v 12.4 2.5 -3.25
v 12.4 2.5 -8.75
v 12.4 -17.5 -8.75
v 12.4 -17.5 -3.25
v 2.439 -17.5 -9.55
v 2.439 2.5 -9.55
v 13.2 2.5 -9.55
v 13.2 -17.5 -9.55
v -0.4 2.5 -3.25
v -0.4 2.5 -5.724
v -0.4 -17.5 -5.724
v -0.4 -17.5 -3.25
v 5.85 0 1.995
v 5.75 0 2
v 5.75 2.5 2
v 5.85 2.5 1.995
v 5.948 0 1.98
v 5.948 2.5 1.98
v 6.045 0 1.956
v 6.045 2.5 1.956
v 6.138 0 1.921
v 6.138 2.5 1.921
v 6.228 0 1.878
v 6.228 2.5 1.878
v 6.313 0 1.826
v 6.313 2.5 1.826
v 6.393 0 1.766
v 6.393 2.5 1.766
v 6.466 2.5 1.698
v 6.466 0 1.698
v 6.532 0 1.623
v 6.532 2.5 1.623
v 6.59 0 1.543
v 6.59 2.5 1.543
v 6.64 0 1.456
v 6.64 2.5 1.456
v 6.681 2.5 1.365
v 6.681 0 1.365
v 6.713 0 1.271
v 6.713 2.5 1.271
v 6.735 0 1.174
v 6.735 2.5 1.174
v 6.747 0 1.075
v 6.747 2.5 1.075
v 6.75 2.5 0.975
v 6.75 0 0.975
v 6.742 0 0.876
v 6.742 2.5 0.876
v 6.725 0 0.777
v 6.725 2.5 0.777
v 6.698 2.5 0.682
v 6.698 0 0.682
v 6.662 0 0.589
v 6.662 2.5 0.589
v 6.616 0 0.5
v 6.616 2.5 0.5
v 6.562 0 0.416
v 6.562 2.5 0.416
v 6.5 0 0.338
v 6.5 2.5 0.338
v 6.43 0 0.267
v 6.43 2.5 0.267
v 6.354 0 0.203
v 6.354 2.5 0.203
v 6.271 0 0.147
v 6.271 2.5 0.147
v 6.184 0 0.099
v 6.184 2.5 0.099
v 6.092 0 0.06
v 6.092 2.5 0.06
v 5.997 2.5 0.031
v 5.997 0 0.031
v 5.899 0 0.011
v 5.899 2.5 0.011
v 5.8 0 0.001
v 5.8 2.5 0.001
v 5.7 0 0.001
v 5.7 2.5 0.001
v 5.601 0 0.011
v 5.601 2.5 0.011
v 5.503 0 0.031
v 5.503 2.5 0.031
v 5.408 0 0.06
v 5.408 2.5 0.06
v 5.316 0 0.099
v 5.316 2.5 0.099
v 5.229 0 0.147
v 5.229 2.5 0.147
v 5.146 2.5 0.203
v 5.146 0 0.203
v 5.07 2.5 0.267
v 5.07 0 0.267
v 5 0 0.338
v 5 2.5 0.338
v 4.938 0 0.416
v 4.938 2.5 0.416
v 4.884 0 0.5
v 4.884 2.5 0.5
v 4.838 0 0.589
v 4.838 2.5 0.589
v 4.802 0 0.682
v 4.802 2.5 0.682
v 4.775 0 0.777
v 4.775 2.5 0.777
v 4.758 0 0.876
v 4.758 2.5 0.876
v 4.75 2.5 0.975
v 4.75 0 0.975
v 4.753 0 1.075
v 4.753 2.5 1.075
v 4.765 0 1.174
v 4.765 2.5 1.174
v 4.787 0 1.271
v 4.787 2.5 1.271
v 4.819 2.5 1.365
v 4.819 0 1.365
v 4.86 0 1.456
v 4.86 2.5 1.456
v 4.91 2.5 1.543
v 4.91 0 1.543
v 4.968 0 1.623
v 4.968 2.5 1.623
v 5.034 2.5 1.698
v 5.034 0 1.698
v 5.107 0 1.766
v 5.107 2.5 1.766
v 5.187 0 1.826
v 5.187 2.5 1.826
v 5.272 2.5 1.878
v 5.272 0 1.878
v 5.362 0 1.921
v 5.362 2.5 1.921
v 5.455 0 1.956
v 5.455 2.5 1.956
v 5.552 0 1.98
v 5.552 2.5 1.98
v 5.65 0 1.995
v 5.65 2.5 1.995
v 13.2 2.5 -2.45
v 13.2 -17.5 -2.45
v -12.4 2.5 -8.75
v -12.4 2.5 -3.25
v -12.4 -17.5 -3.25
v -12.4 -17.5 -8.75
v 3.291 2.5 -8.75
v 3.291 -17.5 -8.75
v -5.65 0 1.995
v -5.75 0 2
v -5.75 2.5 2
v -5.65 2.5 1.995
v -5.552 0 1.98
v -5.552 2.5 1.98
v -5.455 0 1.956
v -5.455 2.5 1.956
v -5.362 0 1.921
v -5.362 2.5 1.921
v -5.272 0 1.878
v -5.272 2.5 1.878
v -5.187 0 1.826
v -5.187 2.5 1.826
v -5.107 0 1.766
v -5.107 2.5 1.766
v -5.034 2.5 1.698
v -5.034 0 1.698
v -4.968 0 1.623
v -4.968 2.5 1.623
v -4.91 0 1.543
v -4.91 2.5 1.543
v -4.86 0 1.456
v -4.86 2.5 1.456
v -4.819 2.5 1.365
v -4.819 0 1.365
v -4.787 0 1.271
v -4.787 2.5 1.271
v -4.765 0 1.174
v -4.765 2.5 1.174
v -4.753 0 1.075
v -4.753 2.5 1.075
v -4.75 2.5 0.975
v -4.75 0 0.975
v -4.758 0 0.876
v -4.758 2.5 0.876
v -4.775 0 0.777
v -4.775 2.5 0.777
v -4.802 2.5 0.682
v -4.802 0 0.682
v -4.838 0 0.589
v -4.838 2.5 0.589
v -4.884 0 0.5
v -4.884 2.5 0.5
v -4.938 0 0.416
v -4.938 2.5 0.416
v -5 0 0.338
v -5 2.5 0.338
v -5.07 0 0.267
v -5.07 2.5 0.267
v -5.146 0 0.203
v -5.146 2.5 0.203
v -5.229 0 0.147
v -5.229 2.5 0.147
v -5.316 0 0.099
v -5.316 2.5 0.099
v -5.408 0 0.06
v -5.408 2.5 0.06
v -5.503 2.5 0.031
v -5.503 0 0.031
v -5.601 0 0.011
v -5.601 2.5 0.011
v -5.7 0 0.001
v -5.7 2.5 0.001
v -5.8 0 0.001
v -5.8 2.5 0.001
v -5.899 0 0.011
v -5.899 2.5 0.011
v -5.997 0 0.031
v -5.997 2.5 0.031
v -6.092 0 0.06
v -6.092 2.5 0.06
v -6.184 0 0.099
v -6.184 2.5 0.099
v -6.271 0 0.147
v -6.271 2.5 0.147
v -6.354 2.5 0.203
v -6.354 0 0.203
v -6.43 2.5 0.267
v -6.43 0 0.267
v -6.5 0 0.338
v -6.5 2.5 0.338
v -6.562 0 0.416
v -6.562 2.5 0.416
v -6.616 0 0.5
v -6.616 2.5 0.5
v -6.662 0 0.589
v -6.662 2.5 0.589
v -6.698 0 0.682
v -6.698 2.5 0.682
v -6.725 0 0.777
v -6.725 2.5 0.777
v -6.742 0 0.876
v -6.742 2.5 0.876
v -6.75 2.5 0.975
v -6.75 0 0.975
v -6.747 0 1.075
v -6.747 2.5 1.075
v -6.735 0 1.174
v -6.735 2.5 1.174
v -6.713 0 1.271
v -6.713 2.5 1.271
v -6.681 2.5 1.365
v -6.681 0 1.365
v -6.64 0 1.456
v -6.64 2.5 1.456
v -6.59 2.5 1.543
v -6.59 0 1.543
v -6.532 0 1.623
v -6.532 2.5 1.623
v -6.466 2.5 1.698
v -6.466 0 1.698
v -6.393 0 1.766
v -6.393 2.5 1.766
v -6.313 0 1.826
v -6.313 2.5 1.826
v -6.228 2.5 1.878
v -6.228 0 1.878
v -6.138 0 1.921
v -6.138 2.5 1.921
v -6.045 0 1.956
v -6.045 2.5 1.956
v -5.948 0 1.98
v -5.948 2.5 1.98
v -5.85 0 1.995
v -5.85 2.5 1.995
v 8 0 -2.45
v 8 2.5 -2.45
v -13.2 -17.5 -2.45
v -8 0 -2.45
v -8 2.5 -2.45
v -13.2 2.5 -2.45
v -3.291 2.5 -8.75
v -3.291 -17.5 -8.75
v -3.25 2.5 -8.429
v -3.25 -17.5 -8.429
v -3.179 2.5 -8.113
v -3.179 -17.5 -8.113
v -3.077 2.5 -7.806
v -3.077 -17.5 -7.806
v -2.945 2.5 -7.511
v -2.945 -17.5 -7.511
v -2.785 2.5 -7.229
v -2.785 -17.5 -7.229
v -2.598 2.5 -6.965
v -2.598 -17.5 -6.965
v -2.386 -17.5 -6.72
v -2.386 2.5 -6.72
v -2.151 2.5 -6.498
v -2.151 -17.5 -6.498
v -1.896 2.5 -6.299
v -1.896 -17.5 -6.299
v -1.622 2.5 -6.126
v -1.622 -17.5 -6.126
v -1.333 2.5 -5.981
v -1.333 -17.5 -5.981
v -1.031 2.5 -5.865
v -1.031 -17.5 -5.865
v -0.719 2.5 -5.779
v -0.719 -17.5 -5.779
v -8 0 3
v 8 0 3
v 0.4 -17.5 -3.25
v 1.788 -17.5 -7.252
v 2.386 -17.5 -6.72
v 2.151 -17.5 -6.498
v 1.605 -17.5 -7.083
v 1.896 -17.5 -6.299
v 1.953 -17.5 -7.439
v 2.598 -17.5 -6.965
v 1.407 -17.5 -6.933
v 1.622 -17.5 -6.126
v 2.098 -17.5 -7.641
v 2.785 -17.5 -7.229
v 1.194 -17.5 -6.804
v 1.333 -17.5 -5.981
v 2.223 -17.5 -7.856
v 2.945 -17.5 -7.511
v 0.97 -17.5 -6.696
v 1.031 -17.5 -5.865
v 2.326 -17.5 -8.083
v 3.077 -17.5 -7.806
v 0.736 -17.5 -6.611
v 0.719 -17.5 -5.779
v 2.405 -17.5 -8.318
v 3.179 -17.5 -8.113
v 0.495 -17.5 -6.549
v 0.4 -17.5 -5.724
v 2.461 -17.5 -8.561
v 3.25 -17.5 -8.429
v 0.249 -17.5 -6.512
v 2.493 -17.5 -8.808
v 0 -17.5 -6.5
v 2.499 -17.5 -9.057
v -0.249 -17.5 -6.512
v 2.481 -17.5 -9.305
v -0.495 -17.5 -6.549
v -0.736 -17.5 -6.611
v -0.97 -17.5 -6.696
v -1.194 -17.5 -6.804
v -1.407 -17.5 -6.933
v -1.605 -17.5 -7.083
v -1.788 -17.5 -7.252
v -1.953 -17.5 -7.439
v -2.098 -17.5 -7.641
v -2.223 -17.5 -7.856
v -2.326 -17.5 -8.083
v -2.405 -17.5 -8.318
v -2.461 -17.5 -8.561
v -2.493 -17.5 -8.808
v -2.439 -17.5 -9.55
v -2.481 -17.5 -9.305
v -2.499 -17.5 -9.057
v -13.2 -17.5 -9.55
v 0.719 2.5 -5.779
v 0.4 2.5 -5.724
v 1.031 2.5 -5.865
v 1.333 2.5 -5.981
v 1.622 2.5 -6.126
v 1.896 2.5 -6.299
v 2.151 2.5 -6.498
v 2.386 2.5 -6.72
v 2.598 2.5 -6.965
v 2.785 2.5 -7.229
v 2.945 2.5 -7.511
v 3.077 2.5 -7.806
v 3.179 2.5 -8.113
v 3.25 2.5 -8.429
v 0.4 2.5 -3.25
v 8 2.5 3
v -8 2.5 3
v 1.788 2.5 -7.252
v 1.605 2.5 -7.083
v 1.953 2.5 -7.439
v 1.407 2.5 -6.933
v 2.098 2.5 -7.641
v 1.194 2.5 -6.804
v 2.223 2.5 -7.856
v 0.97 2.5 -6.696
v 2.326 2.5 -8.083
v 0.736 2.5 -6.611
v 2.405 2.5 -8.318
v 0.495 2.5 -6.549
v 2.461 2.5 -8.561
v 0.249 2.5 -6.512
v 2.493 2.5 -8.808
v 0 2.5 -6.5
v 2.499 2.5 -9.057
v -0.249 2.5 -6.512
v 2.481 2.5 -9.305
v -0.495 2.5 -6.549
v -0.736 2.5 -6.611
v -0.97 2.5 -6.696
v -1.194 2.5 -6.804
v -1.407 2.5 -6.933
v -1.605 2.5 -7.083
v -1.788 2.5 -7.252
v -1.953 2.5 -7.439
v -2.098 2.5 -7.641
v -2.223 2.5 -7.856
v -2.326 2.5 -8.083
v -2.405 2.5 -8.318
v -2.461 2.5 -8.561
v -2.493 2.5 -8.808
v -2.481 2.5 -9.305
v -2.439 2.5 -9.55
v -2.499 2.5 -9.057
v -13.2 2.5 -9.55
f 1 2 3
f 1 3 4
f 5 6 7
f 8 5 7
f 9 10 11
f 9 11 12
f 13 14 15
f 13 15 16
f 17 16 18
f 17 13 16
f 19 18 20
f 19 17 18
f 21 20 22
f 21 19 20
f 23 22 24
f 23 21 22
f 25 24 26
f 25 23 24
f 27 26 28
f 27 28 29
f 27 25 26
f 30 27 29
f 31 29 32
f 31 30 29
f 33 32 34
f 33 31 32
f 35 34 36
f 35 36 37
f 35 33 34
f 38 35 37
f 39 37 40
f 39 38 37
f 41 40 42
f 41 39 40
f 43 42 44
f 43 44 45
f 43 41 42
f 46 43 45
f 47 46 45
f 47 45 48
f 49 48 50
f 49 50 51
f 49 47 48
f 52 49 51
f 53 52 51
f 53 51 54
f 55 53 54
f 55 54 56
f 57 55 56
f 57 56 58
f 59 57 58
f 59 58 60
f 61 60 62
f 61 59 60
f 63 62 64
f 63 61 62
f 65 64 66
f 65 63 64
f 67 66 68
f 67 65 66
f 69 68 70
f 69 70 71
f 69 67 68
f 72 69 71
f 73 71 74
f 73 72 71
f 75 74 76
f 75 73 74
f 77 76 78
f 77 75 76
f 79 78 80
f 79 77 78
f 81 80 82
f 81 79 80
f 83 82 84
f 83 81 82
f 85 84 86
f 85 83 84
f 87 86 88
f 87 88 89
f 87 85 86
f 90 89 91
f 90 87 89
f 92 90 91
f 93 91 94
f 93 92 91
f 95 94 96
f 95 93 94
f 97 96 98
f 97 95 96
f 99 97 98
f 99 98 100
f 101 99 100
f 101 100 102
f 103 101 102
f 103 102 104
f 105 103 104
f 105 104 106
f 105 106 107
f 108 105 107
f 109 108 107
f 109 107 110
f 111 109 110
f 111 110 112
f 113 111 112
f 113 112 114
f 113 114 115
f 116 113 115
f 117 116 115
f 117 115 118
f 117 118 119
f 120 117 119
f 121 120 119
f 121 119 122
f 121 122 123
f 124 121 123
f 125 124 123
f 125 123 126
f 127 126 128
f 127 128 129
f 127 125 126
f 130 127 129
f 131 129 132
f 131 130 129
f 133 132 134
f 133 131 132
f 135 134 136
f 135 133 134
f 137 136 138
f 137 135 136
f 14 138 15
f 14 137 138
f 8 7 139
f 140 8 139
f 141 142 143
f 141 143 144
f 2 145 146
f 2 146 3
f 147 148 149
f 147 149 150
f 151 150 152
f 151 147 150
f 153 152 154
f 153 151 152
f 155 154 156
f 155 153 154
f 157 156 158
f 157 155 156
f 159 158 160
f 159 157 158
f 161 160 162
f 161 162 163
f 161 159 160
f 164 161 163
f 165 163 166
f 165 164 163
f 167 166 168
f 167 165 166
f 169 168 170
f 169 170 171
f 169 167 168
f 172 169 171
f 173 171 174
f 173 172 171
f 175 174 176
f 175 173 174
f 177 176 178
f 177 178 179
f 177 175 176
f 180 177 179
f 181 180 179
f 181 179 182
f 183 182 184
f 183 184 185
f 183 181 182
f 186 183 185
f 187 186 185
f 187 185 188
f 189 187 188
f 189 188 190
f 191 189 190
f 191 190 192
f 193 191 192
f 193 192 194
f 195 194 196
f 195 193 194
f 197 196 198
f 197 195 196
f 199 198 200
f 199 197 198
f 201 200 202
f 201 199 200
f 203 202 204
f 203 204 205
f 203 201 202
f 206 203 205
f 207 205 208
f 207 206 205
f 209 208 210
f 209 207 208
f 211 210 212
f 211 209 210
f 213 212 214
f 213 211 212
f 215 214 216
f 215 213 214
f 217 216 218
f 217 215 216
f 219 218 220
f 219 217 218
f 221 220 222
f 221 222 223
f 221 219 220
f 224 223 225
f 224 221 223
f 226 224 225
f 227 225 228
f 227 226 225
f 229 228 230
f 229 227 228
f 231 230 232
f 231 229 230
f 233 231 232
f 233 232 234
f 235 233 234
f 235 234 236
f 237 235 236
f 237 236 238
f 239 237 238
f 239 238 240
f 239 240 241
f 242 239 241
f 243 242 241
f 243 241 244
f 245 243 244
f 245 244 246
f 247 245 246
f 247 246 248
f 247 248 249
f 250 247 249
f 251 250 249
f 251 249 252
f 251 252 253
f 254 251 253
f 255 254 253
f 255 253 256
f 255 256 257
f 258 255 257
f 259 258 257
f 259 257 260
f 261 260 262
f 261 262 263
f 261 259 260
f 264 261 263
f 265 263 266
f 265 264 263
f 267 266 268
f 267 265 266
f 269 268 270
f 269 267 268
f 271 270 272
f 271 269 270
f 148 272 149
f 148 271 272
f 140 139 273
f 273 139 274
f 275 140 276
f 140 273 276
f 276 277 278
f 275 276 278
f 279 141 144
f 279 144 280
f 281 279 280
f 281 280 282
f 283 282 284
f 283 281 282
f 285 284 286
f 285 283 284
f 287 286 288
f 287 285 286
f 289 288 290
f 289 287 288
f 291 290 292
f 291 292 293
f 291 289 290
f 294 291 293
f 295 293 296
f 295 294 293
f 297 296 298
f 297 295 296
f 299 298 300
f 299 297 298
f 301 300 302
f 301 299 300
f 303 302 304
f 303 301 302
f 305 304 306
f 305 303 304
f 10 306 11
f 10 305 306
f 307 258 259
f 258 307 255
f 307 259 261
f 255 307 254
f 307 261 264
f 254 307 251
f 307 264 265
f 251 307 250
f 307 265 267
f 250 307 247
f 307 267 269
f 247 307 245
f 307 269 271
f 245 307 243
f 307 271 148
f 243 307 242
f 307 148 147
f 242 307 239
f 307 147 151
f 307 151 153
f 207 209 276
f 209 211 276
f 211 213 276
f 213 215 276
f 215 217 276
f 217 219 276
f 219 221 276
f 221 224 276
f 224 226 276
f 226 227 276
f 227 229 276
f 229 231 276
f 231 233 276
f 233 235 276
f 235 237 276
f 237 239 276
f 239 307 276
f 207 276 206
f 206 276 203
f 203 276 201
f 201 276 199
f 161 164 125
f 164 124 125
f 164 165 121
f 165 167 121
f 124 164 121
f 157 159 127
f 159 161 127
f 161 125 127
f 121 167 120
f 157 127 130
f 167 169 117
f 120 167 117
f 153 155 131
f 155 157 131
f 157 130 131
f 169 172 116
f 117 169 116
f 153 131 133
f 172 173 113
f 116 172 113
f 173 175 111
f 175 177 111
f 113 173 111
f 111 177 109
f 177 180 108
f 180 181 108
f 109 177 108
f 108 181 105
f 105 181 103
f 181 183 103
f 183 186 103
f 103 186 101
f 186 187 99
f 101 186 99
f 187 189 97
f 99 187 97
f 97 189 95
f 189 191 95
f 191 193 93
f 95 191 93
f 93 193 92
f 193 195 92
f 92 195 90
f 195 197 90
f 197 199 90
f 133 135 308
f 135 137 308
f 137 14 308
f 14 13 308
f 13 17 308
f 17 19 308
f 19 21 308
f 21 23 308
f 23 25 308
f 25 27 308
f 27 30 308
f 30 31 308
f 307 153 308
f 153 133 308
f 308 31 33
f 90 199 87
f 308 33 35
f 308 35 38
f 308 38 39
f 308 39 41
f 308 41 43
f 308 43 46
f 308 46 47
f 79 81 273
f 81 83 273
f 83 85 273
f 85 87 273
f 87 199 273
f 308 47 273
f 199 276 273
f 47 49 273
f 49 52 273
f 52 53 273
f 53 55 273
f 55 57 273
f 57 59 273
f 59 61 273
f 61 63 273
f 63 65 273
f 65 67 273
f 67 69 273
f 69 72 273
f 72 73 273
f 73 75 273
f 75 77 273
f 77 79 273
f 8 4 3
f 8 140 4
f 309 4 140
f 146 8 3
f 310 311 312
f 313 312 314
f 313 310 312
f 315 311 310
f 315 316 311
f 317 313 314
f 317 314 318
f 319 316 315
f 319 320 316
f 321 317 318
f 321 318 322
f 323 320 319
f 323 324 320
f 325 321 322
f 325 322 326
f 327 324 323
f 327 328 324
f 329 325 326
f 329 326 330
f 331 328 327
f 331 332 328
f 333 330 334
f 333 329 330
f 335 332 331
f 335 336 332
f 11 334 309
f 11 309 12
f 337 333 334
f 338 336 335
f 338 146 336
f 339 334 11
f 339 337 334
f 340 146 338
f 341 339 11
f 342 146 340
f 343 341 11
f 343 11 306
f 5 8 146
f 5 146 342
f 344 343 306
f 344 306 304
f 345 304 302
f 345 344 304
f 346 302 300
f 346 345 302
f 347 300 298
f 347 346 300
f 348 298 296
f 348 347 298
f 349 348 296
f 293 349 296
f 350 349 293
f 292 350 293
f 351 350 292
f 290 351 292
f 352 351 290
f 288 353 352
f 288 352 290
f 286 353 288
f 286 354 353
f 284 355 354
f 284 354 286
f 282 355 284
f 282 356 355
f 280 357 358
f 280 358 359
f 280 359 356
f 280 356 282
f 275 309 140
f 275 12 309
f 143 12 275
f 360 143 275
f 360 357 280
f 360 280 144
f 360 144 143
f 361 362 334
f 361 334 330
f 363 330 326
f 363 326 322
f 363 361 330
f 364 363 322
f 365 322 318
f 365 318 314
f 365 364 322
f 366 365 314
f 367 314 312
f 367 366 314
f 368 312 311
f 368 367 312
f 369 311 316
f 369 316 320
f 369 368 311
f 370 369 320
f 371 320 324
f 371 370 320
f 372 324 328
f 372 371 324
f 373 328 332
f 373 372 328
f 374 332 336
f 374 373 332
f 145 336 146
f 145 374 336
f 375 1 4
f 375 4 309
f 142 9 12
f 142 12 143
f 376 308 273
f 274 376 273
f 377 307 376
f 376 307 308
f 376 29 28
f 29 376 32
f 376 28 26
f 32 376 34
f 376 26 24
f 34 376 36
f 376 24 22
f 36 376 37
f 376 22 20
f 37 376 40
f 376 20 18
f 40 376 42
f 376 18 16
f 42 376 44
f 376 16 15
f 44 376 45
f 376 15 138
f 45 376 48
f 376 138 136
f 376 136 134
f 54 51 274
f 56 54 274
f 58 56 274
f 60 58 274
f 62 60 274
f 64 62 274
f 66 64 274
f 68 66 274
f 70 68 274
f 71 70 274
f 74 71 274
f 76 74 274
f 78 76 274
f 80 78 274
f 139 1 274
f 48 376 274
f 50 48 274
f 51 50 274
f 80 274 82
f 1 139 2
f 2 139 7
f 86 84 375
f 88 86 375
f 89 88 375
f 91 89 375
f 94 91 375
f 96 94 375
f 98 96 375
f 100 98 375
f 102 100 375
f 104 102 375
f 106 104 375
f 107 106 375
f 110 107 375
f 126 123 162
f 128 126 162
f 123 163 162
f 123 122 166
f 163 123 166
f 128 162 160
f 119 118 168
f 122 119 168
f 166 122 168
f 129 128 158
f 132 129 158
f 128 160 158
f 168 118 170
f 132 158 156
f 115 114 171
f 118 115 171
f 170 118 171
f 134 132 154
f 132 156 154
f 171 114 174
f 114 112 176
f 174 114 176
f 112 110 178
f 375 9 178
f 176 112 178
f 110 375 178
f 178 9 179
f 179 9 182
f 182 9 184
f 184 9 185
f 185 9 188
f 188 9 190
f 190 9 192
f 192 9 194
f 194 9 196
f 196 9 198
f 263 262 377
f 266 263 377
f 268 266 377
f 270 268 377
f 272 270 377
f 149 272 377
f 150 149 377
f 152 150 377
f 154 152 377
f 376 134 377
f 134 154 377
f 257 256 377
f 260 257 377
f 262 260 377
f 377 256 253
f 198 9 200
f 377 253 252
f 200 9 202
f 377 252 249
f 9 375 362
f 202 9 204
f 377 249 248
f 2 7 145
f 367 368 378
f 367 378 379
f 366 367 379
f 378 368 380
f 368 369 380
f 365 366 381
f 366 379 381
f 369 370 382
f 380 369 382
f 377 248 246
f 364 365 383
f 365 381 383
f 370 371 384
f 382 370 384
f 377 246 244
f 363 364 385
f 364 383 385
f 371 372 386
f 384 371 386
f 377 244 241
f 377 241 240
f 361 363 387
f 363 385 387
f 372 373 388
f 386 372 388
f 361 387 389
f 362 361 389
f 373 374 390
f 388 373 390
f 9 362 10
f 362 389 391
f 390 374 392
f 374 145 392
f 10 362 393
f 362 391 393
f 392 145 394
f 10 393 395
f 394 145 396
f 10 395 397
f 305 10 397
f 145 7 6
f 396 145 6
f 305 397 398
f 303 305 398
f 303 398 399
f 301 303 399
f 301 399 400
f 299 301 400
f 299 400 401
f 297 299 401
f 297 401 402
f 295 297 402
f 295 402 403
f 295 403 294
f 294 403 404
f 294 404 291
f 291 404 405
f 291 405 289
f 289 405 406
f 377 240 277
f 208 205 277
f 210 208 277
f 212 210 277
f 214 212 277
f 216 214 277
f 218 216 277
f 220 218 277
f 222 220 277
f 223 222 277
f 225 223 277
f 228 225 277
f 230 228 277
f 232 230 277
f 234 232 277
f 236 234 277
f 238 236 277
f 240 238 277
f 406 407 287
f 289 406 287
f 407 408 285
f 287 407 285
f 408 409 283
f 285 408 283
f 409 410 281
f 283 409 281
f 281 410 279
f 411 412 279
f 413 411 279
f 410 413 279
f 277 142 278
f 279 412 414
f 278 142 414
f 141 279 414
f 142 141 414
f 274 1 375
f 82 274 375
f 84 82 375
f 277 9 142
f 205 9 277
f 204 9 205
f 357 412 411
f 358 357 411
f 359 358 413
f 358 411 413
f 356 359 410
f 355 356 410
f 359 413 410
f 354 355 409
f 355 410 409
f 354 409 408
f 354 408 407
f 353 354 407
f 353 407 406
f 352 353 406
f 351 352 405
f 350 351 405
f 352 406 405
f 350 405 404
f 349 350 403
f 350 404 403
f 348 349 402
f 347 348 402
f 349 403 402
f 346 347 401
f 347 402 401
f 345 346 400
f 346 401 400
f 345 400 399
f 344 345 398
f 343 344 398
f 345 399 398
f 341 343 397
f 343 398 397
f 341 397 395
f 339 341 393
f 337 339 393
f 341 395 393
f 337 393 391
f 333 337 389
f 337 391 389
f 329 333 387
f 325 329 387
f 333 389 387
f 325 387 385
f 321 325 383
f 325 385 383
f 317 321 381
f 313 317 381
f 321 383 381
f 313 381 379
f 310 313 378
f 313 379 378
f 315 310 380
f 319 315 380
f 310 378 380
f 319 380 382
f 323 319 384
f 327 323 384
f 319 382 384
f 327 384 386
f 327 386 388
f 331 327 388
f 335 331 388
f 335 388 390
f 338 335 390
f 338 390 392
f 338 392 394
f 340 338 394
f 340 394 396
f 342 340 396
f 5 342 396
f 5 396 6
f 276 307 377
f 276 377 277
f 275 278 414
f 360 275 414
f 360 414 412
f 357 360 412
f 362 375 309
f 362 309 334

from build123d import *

# Parameters (mm, degrees)
ESBO_O2_W                = 16
ESBO_O2_H                = 6
ESBO_O2_R                = 1
RESSALTO_EXTRUS_O4_DEPTH = 2.5
RESSALTO_EXTRUS_O6_DEPTH = 20


with BuildPart() as part:
    # Esboço2 → Ressalto-extrusão4 (new body)
    with BuildSketch(Plane(origin=(0, 0, 0), x_dir=(1, 0, 0), z_dir=(0, 1, 0))):
        Rectangle(ESBO_O2_W, ESBO_O2_H)
        with Locations(Location((-5.75, -1, 0), (0, 0, 270))):
            Circle(ESBO_O2_R, mode=Mode.SUBTRACT)
        with Locations(Location((5.75, -1, 0), (0, 0, 270))):
            Circle(ESBO_O2_R, mode=Mode.SUBTRACT)
    extrude(amount=RESSALTO_EXTRUS_O4_DEPTH)

    # Esboço4 → Ressalto-extrusão6 (add)
    with BuildSketch(Plane(origin=(0, 2.5, 0), x_dir=(1, 0, 0), z_dir=(0, 1, 0))):
        with BuildLine():
            Line((13.2, 2.45), (-13.2, 2.45))
            Line((-13.2, 2.45), (-13.2, 9.55))
            Line((-13.2, 9.55), (-2.43874968, 9.55))
            ThreePointArc((-2.43874968, 9.55), (0, 6.5), (2.43874968, 9.55))
            Line((2.43874968, 9.55), (13.2, 9.55))
            Line((13.2, 9.55), (13.2, 2.45))
        make_face()
        with BuildLine():
            Line((3.290516677, 8.75), (12.4, 8.75))
            Line((12.4, 8.75), (12.4, 3.25))
            Line((12.4, 3.25), (0.4, 3.25))
            Line((0.4, 3.25), (0.4, 5.724332129))
            ThreePointArc((0.4, 5.724332129), (2.386135967, 6.720448476), (3.290516677, 8.75))
        make_face(mode=Mode.SUBTRACT)
        with BuildLine():
            Line((-0.4, 3.25), (-12.4, 3.25))
            Line((-12.4, 3.25), (-12.4, 8.75))
            Line((-12.4, 8.75), (-3.290516677, 8.75))
            ThreePointArc((-3.290516677, 8.75), (-2.386135967, 6.720448476), (-0.4, 5.724332129))
            Line((-0.4, 5.724332129), (-0.4, 3.25))
        make_face(mode=Mode.SUBTRACT)
    extrude(amount=-RESSALTO_EXTRUS_O6_DEPTH)


solid = part.part
